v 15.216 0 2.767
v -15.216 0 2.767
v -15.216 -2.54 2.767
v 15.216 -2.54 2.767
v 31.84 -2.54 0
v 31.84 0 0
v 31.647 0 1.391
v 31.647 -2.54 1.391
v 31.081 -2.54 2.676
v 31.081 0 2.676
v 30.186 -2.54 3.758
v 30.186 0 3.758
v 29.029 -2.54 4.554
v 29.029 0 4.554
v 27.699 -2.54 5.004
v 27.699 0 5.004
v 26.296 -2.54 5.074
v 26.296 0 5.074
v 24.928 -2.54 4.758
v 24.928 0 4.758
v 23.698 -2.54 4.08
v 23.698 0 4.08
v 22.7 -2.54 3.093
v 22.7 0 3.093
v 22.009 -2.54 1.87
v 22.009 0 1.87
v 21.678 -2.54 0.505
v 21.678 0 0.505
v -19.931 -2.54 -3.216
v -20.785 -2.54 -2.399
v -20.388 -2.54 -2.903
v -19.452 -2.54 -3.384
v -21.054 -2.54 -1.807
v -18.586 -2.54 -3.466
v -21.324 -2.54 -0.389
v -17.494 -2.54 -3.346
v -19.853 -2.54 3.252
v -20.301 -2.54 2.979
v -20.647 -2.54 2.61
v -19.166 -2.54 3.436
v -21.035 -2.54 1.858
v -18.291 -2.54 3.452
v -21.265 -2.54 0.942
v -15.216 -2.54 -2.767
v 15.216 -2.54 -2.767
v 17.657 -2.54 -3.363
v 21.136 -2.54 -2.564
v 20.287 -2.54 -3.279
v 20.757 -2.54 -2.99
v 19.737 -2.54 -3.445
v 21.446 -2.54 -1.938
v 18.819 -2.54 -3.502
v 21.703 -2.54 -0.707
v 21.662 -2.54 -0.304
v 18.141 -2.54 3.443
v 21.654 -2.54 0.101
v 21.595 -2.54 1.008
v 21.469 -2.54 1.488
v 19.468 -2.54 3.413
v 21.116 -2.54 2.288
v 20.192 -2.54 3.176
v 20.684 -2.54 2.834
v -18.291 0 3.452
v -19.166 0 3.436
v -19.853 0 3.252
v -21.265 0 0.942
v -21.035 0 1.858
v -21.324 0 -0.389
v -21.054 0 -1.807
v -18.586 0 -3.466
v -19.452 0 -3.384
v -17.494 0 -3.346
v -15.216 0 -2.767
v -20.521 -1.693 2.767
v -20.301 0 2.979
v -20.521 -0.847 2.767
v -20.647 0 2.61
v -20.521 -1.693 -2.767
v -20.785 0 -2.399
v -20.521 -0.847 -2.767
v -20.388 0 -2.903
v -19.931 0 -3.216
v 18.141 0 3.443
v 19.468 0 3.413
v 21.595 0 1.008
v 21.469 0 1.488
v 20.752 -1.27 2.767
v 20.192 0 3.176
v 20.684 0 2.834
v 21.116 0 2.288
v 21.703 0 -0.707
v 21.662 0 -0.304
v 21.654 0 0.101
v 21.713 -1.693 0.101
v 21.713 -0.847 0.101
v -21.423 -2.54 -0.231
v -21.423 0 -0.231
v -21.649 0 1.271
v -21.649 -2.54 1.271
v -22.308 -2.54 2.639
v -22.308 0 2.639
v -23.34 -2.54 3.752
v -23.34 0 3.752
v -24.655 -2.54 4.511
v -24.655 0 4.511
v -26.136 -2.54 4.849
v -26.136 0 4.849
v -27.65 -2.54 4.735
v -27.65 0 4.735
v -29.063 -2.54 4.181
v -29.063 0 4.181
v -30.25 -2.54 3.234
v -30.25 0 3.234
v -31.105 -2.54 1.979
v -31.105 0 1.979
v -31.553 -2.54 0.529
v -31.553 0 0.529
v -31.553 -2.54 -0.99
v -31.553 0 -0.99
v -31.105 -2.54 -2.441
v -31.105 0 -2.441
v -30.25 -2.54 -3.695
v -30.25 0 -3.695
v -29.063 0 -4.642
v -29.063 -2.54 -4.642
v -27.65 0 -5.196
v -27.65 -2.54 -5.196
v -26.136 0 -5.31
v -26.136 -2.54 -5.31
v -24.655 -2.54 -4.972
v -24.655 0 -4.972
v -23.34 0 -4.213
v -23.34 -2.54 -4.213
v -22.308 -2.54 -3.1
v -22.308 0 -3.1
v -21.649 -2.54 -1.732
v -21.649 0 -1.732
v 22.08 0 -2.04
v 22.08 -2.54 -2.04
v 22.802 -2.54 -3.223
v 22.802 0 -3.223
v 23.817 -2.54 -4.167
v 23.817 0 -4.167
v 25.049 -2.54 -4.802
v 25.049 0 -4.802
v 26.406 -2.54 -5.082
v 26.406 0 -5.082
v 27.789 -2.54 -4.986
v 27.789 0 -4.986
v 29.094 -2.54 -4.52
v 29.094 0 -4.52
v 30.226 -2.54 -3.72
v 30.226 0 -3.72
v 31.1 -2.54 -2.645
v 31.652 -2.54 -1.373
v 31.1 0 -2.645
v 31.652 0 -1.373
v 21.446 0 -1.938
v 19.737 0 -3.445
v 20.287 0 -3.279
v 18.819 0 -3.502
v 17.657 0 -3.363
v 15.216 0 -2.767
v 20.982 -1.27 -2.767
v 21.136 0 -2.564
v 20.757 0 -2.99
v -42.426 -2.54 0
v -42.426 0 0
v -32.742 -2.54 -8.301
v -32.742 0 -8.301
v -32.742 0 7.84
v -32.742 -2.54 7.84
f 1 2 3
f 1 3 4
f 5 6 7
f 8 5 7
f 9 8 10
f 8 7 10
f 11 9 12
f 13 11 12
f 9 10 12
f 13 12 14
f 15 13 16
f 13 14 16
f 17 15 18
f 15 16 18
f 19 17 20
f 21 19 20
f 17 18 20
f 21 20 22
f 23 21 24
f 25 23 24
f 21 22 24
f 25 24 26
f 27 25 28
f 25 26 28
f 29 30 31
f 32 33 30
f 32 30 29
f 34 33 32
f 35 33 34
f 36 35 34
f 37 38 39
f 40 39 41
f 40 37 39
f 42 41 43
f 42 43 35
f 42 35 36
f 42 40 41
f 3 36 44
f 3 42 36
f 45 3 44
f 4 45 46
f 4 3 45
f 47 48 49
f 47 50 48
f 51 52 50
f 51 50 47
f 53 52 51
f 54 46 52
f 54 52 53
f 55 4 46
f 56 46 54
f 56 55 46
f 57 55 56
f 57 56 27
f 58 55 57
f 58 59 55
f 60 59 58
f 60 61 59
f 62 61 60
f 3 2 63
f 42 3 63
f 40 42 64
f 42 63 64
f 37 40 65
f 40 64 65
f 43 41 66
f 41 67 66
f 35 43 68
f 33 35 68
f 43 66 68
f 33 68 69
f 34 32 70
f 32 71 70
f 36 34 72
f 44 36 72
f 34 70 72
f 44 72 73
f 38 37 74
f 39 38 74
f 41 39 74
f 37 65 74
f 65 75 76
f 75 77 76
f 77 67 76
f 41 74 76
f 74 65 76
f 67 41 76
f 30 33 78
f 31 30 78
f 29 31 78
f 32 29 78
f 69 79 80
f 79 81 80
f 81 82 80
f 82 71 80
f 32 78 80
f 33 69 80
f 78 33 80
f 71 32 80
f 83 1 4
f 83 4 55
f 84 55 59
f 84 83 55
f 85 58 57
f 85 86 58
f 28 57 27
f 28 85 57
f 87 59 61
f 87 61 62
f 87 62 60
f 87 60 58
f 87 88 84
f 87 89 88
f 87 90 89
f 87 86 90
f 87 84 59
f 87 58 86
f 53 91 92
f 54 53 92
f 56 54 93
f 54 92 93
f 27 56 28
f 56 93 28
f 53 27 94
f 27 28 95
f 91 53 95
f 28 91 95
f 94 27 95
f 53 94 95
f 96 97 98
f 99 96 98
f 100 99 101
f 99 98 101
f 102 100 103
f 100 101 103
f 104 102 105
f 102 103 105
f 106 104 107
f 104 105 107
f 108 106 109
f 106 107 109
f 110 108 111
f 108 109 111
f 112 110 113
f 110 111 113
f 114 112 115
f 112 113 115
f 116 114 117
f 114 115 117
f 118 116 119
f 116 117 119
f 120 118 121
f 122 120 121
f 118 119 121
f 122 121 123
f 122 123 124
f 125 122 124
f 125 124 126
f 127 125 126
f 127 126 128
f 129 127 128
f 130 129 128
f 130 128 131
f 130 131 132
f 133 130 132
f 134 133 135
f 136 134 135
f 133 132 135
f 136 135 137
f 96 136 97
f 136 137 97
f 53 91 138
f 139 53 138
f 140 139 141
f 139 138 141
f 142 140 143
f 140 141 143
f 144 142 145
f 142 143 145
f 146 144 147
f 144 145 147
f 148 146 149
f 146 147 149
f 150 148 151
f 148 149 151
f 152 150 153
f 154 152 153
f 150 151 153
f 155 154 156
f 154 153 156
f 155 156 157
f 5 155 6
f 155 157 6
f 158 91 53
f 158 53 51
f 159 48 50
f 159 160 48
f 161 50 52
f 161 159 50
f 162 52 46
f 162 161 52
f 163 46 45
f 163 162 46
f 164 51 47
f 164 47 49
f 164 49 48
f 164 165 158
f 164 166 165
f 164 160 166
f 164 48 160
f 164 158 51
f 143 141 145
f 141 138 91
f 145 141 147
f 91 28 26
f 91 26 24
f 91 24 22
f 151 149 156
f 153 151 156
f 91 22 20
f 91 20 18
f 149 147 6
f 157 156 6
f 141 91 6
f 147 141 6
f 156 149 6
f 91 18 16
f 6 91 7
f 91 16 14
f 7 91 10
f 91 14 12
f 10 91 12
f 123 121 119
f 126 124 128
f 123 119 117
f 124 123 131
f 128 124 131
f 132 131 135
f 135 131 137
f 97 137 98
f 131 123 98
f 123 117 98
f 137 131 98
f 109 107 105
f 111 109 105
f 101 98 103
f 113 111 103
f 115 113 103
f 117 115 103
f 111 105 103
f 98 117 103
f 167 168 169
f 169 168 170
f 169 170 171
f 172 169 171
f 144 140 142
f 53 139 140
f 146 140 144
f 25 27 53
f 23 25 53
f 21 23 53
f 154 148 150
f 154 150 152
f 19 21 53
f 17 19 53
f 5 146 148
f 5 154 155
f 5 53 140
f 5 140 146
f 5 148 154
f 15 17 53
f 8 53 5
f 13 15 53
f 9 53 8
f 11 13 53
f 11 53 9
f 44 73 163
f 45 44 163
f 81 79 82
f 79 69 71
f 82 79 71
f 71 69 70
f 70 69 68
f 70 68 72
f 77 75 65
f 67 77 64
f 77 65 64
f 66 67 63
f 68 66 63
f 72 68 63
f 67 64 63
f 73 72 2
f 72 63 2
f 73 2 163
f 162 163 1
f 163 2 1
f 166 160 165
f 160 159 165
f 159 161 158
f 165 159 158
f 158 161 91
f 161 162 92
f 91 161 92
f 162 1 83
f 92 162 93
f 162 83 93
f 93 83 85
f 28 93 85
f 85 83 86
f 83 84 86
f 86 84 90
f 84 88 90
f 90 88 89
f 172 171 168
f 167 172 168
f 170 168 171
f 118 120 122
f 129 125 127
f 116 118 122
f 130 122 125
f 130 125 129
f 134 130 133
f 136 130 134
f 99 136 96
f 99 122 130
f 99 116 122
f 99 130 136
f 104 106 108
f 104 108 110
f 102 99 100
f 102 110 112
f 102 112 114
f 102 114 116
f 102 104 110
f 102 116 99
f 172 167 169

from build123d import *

# Parameters (mm, degrees)
F0_R     = 5.0936014399
F1_DEPTH = 2.54
F0_W     = 30.4318889836
F0_H     = 5.5338330567
F3_DEPTH = 2.54


with BuildPart() as f1:
    # F0 (on Front) → F1 (new body)
    with BuildSketch(Plane.XZ):
        with Locations((-26.516282931, -0.2305764065)):
            Circle(F0_R)
    extrude(amount=F1_DEPTH)


with BuildPart() as f1b:
    # F0 (on Front) → F1, piece 2 (new body)
    with BuildSketch(Plane.XZ):
        with BuildLine():
            Line((-15.2159444918, -2.7669165283), (-15.2159444918, 2.7669165283))
            add(Edge.make_bspline(
                [(-15.2159444918, 2.7669165283), (-17.353574529, 3.3890009994), (-21.6072523116, 4.5581842569), (-21.6072523116, -4.5581842569), (-17.353574529, -3.3890009994), (-15.2159444918, -2.7669165283)],
                knots=[0, 0, 0, 0, 0.3309826804, 0.6690173196, 1, 1, 1, 1], degree=3))
        make_face()
        Rectangle(F0_W, F0_H)
        with BuildLine():
            add(Edge.make_bspline(
                [(15.2159444918, 2.7669165283), (17.2424814102, 3.3810666967), (20.5257650284, 4.2502424817), (21.5698992066, 1.4033496754), (21.6783749574, 0.5052101466)],
                knots=[0, 0, 0, 0, 0.3310318426, 0.4709428235, 0.4709428235, 0.4709428235, 0.4709428235], degree=3))
            Line((15.2159444918, 2.7669165283), (15.2159444918, -2.7669165283))
            add(Edge.make_bspline(
                [(21.7025060841, -0.7065914512), (21.6355969577, -1.5246852191), (20.7689928637, -4.2742452326), (17.5977275056, -3.4187762085), (15.2159444918, -2.7669165283)],
                knots=[0.5335157542, 0.5335157542, 0.5335157542, 0.5335157542, 0.6621445845, 1, 1, 1, 1], degree=3))
            ThreePointArc((21.7025060841, -0.7065914512), (21.6542679542, -0.1014109722), (21.6783749574, 0.5052101466))
        make_face()
    extrude(amount=F1_DEPTH)


with BuildPart() as f1c:
    # F0 (on Front) → F1, piece 3 (new body)
    with BuildSketch(Plane.XZ):
        with BuildLine():
            ThreePointArc((31.8404612138, 0), (26.9997768242, 5.0873184089), (21.6783749574, 0.5052101466))
            add(Edge.make_bspline(
                [(21.6783749574, 0.5052101466), (21.7268889883, 0.1035317212), (21.7350547757, -0.3086206032), (21.7025060841, -0.7065914512)],
                knots=[0.4709428235, 0.4709428235, 0.4709428235, 0.4709428235, 0.5335157542, 0.5335157542, 0.5335157542, 0.5335157542], degree=3))
            ThreePointArc((21.7025060841, -0.7065914512), (27.1010125729, -5.0812745865), (31.8404612138, 0))
        make_face()
    extrude(amount=F1_DEPTH)


with BuildPart() as f3:
    # F2 (on Front) → F3 (new body)
    with BuildSketch(Plane.XZ):
        Polygon((-32.7418446541, -8.300749585), (-32.7418446541, 0), (-32.7418446541, 7.8395968303), (-42.4260534346, 0), align=None)
    extrude(amount=F3_DEPTH)


solid = Compound([f1.part, f1b.part, f1c.part, f3.part])
